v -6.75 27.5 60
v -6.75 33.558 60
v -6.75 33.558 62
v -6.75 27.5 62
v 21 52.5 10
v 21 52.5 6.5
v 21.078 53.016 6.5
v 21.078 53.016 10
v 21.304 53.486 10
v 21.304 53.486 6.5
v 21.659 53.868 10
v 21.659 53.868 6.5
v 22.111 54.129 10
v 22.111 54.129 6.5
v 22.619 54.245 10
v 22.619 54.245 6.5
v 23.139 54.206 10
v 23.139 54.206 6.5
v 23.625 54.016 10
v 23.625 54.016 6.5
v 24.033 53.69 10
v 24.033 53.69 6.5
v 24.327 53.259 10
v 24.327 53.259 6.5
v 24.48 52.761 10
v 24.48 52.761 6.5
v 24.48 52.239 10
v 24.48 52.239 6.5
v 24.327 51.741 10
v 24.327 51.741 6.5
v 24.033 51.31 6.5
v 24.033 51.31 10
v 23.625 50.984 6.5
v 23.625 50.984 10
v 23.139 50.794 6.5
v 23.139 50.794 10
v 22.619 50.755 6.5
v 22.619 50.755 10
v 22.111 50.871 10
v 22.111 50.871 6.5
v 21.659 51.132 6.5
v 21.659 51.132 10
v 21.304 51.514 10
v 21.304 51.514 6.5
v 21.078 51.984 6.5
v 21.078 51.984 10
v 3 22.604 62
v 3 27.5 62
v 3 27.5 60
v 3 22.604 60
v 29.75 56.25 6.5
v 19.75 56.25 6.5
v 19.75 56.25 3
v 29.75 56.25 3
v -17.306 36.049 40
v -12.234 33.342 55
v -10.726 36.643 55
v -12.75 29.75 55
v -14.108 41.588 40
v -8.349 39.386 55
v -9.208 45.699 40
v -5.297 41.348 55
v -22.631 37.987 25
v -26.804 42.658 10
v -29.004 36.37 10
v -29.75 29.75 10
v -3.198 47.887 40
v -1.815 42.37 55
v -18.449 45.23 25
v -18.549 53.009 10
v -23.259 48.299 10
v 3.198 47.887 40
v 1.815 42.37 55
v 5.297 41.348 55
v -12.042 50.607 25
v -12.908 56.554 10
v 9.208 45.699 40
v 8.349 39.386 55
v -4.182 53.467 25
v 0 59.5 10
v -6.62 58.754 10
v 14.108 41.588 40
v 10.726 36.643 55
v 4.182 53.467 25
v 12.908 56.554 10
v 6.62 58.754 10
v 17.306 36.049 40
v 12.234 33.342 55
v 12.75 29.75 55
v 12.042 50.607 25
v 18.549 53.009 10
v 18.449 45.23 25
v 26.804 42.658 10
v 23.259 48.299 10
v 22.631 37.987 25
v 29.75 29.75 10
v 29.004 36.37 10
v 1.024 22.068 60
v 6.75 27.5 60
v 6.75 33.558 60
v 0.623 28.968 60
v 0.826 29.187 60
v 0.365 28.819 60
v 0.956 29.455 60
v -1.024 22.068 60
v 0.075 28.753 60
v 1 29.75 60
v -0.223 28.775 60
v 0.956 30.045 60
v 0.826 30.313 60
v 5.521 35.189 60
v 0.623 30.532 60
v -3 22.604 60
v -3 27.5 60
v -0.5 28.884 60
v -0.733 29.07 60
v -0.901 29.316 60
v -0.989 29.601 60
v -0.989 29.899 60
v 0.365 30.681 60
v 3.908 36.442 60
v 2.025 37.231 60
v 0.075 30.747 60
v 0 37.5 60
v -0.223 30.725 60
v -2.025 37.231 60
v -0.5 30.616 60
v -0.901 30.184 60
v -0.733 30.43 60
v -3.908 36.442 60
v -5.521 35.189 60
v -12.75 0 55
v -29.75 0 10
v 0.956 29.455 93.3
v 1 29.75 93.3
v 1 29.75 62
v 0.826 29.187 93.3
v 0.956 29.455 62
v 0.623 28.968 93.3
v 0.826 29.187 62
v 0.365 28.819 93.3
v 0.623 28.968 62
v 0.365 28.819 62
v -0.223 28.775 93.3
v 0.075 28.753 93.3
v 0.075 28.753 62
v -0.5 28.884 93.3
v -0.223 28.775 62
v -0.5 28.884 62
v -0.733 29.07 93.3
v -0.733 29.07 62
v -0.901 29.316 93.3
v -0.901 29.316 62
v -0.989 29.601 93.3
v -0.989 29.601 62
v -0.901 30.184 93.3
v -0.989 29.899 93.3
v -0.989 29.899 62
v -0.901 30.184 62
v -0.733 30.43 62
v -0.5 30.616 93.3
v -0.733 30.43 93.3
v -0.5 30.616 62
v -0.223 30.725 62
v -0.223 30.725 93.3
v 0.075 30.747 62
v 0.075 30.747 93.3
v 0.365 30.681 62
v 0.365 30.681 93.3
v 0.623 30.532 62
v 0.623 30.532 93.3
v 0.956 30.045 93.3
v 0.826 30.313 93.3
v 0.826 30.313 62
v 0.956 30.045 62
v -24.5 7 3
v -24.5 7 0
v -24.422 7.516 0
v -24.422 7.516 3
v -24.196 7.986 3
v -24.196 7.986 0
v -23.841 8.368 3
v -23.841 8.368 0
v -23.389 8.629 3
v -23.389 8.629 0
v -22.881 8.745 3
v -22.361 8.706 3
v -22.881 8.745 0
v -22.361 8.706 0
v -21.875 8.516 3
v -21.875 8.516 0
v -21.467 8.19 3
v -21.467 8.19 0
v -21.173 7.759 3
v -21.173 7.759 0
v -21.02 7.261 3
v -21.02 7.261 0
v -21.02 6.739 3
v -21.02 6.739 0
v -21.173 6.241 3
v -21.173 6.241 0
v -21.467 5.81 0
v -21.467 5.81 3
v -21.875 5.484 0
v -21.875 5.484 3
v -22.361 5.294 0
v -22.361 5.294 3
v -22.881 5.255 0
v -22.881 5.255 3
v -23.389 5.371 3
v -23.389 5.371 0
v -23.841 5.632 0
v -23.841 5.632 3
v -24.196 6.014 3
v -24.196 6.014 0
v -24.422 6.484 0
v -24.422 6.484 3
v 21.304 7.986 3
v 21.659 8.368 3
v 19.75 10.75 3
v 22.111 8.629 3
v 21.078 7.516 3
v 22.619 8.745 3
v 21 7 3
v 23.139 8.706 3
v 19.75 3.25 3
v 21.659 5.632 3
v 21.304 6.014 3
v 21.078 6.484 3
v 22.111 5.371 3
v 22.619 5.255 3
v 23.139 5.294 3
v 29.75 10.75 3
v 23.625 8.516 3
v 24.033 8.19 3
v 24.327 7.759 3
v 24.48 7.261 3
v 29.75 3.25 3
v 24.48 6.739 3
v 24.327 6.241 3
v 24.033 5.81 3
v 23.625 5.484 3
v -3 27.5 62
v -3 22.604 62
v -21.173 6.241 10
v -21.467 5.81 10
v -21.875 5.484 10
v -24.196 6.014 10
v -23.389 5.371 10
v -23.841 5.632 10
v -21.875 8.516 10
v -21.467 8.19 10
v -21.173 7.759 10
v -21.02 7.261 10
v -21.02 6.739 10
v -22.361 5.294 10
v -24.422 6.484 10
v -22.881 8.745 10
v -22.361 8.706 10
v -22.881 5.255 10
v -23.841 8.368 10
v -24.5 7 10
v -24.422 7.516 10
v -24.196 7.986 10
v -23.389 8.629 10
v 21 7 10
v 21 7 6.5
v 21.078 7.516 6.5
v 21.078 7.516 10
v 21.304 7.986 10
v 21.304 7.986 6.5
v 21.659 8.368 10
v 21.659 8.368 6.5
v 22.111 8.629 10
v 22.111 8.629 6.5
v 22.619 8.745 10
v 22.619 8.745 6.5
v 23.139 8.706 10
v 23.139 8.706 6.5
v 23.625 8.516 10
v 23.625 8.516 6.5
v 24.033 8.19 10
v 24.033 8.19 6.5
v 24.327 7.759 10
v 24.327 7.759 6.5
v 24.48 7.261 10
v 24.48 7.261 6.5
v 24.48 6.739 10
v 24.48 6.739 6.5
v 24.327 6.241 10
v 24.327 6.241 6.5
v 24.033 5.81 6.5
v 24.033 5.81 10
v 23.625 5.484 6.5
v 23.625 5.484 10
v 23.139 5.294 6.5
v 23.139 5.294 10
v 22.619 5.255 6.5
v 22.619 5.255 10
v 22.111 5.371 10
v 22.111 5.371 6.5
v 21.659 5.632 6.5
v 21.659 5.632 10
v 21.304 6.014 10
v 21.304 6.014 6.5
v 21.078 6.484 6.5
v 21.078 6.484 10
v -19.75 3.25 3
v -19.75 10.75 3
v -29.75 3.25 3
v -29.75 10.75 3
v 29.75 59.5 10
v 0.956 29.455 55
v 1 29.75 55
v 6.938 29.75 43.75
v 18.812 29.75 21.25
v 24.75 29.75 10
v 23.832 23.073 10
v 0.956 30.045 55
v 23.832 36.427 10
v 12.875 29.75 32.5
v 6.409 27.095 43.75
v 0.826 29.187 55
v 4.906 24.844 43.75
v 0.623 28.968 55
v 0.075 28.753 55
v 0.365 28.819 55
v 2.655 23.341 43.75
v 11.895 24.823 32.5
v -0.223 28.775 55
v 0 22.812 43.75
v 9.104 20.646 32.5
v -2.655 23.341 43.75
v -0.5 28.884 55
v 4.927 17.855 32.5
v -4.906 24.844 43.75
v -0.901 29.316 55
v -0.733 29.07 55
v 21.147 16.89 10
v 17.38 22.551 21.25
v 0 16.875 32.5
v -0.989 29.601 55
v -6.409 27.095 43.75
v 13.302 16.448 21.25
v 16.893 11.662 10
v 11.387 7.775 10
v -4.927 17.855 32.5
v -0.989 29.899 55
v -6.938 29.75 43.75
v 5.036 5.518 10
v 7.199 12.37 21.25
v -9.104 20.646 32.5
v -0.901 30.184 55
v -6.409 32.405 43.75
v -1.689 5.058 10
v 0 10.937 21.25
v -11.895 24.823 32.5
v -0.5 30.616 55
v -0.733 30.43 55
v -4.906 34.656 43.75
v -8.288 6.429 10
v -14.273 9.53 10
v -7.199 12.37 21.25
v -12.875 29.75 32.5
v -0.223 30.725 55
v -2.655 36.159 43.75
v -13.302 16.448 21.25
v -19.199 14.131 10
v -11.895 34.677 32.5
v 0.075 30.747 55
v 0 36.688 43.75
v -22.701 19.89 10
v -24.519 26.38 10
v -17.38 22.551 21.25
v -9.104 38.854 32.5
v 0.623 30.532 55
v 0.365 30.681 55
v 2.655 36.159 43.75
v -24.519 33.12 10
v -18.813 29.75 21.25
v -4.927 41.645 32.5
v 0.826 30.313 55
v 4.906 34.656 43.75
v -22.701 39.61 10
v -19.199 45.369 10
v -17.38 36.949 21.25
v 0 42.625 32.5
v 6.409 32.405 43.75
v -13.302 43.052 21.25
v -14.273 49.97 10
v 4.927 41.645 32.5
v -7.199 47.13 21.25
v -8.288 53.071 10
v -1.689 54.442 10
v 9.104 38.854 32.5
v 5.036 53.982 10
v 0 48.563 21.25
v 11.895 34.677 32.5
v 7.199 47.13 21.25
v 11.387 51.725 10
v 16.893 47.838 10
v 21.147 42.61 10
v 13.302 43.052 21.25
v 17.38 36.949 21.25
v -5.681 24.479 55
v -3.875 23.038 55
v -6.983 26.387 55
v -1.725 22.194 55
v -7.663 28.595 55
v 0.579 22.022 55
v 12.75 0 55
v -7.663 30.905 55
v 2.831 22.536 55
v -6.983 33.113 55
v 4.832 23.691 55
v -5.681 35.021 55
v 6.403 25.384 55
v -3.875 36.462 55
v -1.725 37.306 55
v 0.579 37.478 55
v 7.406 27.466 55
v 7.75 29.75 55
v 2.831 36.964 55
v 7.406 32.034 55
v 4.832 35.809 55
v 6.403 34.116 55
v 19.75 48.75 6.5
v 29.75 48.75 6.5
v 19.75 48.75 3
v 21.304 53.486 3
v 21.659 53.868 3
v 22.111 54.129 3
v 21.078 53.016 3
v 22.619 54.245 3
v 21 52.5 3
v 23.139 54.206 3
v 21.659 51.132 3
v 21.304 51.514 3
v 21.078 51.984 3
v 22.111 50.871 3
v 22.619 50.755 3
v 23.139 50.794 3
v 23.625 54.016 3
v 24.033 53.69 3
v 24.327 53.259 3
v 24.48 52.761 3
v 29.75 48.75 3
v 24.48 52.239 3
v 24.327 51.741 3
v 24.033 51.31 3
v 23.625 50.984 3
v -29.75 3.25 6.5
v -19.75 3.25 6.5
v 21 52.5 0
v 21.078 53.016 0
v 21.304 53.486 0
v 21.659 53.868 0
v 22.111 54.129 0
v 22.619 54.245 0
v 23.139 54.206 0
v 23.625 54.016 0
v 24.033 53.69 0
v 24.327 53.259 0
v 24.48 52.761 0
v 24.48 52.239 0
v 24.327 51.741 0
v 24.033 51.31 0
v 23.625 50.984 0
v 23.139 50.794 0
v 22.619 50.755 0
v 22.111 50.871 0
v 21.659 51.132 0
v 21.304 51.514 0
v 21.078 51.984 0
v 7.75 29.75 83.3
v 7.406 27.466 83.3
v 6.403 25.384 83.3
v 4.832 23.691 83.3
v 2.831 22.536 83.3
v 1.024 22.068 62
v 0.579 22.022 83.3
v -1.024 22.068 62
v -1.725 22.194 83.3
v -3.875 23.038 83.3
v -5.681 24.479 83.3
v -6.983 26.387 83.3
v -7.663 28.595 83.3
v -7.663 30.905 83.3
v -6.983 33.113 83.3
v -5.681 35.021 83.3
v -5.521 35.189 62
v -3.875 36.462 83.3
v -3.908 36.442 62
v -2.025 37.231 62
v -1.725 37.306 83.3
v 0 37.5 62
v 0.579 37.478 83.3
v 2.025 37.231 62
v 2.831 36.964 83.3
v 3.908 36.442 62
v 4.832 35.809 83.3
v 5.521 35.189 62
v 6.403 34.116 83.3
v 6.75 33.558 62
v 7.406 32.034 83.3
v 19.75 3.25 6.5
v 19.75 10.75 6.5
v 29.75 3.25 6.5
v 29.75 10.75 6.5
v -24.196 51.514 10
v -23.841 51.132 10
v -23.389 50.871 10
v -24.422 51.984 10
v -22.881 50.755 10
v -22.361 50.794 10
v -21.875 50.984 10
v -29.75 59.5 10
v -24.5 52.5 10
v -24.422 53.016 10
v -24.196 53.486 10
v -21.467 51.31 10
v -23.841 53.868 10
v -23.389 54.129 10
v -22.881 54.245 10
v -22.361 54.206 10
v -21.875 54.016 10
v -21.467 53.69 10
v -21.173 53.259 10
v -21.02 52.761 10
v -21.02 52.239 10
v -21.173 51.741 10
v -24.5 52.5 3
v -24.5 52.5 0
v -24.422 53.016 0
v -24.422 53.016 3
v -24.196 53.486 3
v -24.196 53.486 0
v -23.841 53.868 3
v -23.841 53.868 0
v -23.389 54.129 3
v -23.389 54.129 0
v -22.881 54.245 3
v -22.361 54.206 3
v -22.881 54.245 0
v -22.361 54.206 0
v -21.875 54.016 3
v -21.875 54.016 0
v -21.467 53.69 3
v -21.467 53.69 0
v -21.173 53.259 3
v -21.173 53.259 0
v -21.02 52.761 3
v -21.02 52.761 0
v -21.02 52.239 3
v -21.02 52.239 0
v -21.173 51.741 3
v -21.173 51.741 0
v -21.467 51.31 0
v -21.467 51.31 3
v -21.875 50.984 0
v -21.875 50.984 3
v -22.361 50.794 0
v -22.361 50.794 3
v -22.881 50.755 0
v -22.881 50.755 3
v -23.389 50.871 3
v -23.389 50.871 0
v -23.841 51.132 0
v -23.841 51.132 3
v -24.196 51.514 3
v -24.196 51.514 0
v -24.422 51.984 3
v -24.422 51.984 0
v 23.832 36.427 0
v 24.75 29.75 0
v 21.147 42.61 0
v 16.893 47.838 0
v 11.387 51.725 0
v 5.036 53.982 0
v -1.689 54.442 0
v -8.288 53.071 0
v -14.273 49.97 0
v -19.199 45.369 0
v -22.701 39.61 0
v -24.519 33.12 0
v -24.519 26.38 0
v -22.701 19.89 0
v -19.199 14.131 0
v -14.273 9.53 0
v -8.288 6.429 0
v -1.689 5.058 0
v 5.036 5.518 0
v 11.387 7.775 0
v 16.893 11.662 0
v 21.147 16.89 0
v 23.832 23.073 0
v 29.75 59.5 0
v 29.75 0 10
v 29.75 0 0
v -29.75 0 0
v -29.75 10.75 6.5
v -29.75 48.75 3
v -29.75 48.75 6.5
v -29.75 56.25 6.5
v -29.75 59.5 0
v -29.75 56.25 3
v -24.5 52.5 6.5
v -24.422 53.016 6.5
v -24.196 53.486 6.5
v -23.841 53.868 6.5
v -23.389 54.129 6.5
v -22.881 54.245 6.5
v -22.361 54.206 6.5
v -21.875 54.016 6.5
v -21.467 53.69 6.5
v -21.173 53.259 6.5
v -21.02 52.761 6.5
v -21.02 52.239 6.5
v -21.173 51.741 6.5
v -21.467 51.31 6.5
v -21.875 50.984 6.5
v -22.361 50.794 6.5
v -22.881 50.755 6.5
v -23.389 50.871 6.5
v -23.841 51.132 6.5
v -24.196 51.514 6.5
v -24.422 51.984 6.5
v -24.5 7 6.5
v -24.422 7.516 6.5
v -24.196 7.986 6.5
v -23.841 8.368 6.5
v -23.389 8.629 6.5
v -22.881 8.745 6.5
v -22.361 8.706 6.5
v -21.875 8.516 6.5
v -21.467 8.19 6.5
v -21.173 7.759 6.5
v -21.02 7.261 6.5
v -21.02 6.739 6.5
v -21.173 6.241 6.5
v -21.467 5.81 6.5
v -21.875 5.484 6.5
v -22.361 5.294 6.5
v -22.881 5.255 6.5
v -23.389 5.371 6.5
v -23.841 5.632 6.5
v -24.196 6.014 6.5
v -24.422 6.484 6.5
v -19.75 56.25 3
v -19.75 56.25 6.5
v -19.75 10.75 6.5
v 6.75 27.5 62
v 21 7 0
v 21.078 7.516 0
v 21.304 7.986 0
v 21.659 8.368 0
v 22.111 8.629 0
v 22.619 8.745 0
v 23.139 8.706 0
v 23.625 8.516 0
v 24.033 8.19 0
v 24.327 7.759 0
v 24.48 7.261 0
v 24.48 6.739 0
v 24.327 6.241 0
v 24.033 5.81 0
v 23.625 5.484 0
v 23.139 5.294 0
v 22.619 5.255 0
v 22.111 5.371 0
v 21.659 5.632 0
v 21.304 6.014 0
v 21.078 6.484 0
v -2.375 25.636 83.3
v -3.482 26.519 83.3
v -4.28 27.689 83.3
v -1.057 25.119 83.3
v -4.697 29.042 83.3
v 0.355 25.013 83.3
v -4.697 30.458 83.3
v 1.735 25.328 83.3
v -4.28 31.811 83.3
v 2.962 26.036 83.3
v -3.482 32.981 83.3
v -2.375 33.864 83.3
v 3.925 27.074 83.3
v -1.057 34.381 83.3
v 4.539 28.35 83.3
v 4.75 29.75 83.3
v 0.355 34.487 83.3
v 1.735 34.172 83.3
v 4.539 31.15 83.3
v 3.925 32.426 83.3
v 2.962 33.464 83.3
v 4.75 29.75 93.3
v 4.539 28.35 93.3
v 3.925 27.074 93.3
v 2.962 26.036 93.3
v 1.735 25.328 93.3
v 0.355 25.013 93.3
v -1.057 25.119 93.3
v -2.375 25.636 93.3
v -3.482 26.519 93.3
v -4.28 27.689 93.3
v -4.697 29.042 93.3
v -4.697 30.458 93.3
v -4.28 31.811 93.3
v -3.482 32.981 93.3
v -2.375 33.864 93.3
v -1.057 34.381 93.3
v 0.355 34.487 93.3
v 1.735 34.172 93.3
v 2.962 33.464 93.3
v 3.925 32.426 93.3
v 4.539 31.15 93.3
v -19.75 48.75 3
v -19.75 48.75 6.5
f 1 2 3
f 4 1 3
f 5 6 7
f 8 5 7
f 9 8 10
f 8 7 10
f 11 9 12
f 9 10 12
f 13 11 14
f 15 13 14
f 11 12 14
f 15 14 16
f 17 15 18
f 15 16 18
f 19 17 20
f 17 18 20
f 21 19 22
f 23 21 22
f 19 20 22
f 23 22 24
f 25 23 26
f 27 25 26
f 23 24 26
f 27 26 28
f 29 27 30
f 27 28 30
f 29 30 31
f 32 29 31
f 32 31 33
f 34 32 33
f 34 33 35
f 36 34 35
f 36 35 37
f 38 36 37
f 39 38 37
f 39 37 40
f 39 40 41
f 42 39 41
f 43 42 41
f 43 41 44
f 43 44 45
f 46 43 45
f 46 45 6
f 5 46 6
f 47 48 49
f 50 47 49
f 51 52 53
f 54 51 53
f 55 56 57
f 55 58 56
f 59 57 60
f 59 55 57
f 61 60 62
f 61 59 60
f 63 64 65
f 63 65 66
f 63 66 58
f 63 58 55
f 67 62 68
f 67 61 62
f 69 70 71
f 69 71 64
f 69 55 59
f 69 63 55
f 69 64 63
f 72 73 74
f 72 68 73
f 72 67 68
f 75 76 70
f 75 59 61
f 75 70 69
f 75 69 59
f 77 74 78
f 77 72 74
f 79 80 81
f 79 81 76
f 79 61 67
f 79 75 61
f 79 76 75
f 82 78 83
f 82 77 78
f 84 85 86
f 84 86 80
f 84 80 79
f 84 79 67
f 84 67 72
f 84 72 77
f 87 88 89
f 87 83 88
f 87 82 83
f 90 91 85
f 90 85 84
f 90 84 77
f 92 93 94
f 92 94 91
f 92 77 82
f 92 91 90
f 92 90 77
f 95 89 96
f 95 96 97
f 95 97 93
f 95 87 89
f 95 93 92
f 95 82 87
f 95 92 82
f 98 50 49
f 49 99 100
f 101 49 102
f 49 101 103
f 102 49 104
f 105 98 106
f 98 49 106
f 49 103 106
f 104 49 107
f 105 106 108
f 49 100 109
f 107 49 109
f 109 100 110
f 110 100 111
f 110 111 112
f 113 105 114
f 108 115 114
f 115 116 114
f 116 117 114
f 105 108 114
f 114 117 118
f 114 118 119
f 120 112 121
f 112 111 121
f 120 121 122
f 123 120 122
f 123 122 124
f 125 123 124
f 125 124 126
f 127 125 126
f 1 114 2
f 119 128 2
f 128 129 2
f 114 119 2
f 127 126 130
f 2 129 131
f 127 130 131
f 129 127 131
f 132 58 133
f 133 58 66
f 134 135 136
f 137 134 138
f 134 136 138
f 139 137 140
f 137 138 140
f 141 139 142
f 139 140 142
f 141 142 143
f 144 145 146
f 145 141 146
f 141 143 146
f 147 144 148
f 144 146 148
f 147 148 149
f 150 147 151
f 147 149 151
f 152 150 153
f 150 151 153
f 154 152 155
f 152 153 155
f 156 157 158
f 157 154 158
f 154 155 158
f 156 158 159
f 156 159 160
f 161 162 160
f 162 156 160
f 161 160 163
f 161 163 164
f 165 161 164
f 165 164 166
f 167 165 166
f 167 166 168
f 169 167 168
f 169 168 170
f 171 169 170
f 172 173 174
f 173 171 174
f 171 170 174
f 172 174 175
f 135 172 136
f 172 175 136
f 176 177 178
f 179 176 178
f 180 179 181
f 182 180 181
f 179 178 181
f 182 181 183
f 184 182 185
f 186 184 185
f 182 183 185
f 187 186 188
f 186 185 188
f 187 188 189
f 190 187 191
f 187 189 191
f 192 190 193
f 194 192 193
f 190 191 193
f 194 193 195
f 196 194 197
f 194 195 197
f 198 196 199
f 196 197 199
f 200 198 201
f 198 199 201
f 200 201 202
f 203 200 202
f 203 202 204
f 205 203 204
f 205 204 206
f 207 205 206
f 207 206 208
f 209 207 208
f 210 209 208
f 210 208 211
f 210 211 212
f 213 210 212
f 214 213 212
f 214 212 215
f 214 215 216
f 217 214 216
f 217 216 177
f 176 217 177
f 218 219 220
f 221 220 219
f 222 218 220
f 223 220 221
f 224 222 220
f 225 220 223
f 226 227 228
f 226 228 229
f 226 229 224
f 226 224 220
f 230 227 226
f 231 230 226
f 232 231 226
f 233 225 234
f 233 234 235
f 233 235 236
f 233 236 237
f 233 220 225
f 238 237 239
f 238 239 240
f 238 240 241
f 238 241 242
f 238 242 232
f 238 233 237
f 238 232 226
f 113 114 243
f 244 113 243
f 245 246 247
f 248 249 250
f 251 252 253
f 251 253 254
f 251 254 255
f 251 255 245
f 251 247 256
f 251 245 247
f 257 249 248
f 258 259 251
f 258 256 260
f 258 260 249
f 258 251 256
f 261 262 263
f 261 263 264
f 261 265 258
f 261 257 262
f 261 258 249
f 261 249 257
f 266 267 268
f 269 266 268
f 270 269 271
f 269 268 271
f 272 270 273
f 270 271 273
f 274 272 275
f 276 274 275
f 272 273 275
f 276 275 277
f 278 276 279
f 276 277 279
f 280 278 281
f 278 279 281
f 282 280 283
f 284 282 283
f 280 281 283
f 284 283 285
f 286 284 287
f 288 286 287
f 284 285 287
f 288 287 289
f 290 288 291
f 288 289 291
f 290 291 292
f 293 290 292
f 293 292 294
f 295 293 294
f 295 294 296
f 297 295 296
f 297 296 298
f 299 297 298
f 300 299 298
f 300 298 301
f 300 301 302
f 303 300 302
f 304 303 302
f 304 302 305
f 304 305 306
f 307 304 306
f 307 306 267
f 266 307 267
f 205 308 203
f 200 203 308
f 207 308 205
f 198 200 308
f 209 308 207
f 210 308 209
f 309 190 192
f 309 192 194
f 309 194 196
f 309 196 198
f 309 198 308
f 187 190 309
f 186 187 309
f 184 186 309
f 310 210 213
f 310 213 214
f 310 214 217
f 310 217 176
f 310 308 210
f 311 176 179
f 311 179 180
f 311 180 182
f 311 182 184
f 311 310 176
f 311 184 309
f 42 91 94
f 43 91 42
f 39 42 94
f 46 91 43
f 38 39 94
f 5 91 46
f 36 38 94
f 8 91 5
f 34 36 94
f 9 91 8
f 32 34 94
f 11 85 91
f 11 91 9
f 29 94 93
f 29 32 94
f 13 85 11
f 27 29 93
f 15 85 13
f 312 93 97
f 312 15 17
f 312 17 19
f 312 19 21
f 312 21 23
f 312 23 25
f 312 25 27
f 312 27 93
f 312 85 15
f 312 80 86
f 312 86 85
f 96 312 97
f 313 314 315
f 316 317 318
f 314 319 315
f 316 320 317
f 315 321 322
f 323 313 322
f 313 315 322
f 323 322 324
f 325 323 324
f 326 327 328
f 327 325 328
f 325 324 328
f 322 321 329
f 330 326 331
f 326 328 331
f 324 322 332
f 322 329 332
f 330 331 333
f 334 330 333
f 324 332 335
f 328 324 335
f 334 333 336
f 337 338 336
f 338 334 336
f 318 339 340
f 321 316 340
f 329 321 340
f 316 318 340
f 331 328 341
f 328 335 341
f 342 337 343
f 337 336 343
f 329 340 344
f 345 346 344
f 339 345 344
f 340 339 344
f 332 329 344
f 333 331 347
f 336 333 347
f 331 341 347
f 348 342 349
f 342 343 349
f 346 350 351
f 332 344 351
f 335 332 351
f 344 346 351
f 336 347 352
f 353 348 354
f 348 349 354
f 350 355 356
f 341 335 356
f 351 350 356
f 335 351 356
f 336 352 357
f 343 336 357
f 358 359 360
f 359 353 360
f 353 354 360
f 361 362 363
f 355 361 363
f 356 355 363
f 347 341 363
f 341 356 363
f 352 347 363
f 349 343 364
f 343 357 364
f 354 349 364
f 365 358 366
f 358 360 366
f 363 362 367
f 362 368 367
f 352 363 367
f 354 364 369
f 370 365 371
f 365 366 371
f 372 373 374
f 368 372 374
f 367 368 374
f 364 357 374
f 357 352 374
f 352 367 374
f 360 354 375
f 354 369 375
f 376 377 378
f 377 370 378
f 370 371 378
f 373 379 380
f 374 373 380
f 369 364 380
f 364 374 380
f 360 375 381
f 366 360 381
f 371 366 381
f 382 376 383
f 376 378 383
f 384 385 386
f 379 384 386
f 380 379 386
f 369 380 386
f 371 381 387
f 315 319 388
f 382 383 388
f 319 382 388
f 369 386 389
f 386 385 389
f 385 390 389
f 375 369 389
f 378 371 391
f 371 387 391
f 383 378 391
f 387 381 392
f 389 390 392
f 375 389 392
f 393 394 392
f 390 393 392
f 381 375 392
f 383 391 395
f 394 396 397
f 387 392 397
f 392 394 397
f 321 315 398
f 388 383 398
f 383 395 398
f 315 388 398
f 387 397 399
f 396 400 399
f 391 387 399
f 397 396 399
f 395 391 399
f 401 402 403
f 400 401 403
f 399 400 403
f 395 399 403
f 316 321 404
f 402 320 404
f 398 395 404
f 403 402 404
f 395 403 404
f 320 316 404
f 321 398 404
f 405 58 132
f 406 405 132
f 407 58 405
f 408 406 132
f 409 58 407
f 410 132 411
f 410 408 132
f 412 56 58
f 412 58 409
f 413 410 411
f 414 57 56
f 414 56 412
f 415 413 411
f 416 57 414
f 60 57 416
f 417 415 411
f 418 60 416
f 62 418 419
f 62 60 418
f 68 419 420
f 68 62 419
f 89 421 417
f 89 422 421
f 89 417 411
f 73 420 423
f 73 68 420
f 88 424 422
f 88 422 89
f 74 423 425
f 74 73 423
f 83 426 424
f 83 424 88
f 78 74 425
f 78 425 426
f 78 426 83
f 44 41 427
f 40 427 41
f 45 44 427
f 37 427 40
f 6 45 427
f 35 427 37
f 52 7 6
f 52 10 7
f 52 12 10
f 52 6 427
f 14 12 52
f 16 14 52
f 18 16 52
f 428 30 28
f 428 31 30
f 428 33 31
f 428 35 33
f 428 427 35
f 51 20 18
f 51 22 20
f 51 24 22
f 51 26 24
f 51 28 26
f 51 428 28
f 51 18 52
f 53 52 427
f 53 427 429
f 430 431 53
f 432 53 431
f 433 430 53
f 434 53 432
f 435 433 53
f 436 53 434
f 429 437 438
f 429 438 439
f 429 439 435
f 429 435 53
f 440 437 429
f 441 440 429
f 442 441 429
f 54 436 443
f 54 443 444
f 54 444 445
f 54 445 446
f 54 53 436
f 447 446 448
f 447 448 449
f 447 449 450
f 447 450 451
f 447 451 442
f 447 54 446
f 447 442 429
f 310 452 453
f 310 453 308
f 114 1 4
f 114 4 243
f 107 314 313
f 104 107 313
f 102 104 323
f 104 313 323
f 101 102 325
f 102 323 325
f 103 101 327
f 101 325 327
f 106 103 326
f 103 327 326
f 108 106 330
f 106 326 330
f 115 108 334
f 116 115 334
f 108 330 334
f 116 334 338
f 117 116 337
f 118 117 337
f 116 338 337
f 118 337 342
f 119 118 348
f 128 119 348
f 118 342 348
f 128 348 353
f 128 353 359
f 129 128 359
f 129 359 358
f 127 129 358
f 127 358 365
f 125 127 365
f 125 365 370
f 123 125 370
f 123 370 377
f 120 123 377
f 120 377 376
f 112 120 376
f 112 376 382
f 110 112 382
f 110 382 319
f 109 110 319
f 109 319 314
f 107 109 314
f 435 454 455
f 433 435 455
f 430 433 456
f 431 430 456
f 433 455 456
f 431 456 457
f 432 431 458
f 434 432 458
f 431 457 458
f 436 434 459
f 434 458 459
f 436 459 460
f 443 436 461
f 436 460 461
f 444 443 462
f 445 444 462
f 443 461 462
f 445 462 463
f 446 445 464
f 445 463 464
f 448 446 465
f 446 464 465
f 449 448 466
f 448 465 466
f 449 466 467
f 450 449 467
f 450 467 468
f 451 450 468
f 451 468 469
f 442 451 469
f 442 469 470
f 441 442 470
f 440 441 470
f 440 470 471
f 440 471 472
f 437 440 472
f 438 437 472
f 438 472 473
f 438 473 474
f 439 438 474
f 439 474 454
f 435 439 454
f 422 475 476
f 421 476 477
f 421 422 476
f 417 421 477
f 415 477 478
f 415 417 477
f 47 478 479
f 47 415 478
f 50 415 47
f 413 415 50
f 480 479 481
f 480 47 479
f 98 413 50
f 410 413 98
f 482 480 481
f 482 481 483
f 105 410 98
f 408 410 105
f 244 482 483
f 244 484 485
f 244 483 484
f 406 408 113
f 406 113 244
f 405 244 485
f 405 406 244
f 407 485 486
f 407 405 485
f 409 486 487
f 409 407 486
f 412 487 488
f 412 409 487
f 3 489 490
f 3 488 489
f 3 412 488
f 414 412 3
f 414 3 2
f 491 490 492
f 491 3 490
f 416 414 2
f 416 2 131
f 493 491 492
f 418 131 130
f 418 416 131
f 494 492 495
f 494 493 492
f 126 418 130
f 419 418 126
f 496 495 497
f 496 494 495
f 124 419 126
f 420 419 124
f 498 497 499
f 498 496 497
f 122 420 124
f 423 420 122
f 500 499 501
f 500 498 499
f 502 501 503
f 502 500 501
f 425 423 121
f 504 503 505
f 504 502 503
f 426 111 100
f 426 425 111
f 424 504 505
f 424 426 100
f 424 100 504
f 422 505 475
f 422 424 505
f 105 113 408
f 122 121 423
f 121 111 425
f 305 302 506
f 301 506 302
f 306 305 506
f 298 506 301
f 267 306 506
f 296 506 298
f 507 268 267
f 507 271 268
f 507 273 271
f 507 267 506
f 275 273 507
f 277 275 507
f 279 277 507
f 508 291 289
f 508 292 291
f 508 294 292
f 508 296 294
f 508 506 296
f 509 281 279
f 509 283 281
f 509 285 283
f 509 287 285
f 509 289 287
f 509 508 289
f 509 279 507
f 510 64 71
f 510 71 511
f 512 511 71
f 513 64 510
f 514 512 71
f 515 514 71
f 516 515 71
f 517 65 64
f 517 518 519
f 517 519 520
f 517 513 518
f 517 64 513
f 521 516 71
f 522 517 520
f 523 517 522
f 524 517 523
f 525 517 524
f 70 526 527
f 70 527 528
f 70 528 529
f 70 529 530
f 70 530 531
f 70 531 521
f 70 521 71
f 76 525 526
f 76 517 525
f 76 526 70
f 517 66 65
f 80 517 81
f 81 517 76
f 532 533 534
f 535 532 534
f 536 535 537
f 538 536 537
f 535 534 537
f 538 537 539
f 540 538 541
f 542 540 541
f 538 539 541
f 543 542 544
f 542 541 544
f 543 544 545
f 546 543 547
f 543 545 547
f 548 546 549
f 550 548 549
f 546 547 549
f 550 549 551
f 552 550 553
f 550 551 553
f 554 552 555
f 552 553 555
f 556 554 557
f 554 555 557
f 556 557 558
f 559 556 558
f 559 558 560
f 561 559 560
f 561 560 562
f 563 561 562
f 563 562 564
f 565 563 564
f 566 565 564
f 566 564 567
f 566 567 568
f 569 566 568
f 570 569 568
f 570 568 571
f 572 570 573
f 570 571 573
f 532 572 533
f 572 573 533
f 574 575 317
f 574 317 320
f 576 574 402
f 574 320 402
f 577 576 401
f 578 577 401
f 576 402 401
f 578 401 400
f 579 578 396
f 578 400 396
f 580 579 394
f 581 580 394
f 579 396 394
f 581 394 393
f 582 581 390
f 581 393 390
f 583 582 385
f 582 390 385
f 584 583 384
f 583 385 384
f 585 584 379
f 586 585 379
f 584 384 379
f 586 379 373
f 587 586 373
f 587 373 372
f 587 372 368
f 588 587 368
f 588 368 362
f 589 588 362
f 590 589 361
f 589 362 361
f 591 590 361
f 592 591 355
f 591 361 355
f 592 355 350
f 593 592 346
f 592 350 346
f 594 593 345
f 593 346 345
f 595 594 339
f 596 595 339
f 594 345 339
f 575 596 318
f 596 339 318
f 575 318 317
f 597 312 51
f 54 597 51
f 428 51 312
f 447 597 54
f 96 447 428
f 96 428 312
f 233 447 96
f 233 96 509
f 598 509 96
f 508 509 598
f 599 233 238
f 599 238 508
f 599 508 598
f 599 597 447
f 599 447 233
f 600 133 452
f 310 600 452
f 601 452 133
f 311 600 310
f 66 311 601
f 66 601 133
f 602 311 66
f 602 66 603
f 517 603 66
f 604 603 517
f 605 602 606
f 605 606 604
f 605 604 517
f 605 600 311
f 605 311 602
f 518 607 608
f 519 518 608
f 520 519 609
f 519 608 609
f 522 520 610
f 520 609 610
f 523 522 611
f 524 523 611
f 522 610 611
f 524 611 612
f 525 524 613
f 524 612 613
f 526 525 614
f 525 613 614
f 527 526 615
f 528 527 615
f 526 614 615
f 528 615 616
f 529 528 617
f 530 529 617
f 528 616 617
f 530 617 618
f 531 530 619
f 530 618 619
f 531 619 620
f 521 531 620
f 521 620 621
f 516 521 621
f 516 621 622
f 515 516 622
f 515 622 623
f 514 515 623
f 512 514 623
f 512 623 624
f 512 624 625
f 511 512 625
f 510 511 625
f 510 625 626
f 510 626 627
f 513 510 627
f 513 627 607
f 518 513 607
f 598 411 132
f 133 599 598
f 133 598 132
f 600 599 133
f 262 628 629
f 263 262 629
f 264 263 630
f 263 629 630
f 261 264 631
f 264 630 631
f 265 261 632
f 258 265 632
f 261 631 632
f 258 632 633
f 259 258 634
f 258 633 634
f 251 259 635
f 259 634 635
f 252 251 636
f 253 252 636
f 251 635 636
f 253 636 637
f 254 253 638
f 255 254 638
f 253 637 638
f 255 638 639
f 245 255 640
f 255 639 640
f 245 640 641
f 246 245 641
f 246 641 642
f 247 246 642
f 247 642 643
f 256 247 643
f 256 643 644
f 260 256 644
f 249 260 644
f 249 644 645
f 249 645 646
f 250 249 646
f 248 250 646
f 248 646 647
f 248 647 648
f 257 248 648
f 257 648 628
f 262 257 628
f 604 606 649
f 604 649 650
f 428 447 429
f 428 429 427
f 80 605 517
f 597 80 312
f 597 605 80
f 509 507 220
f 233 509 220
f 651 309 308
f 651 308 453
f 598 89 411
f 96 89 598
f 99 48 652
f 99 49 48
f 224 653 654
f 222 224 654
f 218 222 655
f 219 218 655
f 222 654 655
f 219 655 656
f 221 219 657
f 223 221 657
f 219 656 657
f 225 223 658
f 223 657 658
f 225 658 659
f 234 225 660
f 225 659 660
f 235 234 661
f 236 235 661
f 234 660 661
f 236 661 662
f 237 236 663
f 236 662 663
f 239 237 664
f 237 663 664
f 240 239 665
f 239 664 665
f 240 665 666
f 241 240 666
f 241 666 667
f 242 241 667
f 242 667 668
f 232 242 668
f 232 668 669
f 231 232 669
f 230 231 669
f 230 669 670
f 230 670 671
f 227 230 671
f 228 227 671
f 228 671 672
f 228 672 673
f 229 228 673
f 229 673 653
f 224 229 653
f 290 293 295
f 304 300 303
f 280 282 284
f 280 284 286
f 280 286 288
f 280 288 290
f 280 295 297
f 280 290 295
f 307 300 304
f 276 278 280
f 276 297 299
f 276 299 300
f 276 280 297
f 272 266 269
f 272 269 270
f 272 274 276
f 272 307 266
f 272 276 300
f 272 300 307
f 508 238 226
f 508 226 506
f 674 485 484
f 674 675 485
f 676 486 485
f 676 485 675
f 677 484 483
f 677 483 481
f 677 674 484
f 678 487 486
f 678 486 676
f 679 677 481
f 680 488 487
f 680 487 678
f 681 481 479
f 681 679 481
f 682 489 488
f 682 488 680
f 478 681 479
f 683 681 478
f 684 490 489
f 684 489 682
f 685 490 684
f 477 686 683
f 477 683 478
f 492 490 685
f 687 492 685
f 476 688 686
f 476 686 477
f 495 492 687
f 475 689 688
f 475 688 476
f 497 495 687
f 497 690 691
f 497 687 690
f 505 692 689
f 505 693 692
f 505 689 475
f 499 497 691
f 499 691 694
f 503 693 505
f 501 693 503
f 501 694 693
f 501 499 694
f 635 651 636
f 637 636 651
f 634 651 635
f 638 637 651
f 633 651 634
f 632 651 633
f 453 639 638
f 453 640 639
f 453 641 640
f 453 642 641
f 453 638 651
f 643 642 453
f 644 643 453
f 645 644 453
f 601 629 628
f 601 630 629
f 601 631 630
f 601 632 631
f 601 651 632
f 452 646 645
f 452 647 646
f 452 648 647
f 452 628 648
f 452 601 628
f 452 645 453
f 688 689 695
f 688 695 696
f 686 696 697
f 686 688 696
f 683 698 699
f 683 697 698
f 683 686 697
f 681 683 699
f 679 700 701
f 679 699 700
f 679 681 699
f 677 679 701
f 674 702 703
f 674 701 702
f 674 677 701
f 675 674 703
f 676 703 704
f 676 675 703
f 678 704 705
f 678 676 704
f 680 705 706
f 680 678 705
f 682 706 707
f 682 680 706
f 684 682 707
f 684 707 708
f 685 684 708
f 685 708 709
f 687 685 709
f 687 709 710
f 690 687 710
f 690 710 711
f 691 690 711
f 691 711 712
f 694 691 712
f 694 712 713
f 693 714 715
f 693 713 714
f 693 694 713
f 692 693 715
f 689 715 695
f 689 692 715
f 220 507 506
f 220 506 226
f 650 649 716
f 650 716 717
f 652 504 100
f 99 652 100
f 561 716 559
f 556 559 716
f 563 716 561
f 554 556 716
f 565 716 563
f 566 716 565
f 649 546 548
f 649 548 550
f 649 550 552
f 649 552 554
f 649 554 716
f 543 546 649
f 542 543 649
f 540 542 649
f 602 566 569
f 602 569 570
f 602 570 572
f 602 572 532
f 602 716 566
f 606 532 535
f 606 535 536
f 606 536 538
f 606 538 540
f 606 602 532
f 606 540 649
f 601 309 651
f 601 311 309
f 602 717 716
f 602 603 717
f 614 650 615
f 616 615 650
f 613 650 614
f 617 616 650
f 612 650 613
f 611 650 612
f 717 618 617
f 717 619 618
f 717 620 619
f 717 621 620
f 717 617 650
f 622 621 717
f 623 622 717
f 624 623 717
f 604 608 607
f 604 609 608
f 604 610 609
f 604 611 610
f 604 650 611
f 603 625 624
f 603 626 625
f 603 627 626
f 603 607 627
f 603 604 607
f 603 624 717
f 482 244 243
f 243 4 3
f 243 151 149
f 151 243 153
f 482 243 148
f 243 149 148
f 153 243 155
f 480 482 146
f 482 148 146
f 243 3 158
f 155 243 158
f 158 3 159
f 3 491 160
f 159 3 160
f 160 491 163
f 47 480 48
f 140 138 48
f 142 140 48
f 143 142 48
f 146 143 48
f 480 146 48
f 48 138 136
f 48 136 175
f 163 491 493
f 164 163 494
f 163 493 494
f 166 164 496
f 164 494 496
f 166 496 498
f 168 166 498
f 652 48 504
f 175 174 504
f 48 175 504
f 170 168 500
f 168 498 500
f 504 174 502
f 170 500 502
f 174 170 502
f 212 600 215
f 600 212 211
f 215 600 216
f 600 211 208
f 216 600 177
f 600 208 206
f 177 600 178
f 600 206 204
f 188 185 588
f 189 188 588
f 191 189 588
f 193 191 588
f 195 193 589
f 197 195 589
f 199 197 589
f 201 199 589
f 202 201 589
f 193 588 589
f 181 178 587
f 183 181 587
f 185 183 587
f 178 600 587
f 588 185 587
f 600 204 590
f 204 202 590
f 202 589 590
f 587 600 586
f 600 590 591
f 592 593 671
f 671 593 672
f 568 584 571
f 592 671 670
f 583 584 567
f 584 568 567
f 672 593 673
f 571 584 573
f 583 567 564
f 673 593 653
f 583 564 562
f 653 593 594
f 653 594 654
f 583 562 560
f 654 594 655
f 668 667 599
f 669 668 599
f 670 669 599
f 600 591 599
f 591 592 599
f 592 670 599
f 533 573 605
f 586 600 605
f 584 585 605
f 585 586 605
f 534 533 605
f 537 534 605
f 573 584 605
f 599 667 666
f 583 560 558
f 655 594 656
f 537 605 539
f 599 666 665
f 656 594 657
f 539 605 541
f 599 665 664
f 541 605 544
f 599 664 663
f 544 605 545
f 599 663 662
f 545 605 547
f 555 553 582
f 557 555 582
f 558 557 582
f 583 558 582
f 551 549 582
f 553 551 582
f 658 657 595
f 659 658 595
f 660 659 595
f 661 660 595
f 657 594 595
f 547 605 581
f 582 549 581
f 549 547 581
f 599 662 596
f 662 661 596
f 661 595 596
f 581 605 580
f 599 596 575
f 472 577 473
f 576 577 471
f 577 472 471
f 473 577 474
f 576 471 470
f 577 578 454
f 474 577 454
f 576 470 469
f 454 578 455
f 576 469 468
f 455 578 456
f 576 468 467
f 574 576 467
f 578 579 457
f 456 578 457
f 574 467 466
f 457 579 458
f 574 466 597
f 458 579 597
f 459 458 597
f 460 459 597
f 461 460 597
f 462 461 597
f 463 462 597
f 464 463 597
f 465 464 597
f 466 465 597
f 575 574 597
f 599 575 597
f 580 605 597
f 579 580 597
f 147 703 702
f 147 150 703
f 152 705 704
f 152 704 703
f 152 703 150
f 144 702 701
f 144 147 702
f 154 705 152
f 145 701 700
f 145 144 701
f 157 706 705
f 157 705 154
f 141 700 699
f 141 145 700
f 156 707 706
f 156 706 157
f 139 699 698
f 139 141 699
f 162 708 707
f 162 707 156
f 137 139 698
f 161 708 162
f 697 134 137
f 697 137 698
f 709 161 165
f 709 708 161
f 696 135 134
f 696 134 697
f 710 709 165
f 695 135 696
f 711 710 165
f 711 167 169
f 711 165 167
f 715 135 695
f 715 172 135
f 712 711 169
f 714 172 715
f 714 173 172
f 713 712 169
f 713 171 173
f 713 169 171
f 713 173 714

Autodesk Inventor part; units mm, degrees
ref_plane "YZ Plane" through (0, 0, 0) normal (1, 0, 0) x (0, 1, 0)
ref_plane "XZ Plane" through (0, 0, 0) normal (0, 1, 0) x (-1, 0, 0)
sketch "Sketch2" plane through (0, 0, 0) normal (0, 0, 1) x (1, 0, 0)
  line L0 (-29.75, 59.5) -> (29.75, 59.5)
  line L1 (29.75, 59.5) -> (29.75, 0)
  line L2 (29.75, 0) -> (-29.75, 0)
  line L3 (-29.75, 0) -> (-29.75, 59.5)
  point P0 (0, 0)
  point P1 (0, 0)
  dimension "d0" = 59.5
extrude "Extrusion1" add sketch "Sketch2" along normal blind 55
sketch "Sketch3" plane through (0, 0, 55) normal (0, 0, 1) x (1, 0, 0)
  circle A0 centre (0, 29.75) radius 1
  circle A1 centre (0, 29.75) radius 7.75
  line L0 (0, 0) -> (0, 59.5) construction
  line L1 (29.75, 59.5) -> (-29.75, 59.5) construction
  line L2 (29.75, 0) -> (29.75, 59.5) construction
  line L3 (29.75, 29.75) -> (-29.75, 29.75) construction
  line L4 (-29.75, 59.5) -> (-29.75, 0) construction
  line L5 (-29.75, 0) -> (29.75, 0) projected
  dimension "d3" = 15.5
  dimension "d5" = 2
  dimension "d47" = 22
extrude "Extrusion2" add sketch "Sketch3" along normal blind 28.3
sketch "Sketch4" plane through (0, 29.75, 83.3) normal (0, 0, 1) x (1, 0, 0)
  circle A0 centre (0, 0) radius 1
  circle A1 centre (0, 0) radius 4.75
  circle A2 centre (0, 0) radius 1 projected
  point P0 (0, -29.75)
  dimension "d8" = 9.5
extrude "Extrusion3" add sketch "Sketch4" along normal blind 10
sketch "Sketch10" plane through (0, 0, 0) normal (0, 0, -1) x (-1, 0, 0)
  circle A0 centre (-22.75, 52.5) radius 1.75
  circle A1 centre (-22.75, 7) radius 1.75
  circle A2 centre (22.75, 52.5) radius 1.75
  circle A3 centre (22.75, 7) radius 1.75
  line L0 (-29.75, 59.5) -> (-29.75, 0) projected
  line L1 (29.75, 59.5) -> (-29.75, 59.5) projected
  line L2 (-29.75, 29.75) -> (29.75, 29.75) construction
  line L3 (29.75, 0) -> (29.75, 59.5) construction
  line L4 (0, 59.5) -> (0, 0) construction
  dimension "d29" = 7
  dimension "d30" = 7
  dimension "d33" = 3.5
extrude "Extrusion5" cut sketch "Sketch10" against normal blind 10
sketch "Sketch9" plane through (29.75, 0, 0) normal (1, 0, 0) x (0, 0, -1)
  line L0 (-6.5, 56.25) -> (-3, 56.25)
  line L1 (-3, 56.25) -> (-3, 48.75)
  line L2 (-3, 48.75) -> (-6.5, 48.75)
  line L3 (-6.5, 48.75) -> (-6.5, 56.25)
  line L4 (-6.5, 10.75) -> (-3, 10.75)
  line L5 (-3, 10.75) -> (-3, 3.25)
  line L6 (-3, 3.25) -> (-6.5, 3.25)
  line L7 (-6.5, 3.25) -> (-6.5, 10.75)
  line L8 (0, 59.5) -> (-55, 59.5) projected
  line L9 (-55, 0) -> (-55, 59.5) construction
  line L10 (-55, 29.75) -> (0, 29.75) construction
  line L11 (0, 0) -> (0, 59.5) construction
  line L12 (0, 54.25) -> (0, 50.75) projected
  line L13 (0, 52.5) -> (-10, 52.5) construction
  line L14 (-10, 54.25) -> (-10, 50.75) projected
  dimension "d24" = 7.5
  dimension "d25" = 3.5
  dimension "d26" = 3
extrude "Extrusion4" cut sketch "Sketch9" against normal blind 10
mirror "Mirror1" about plane through (0, 0, 0) normal (1, 0, 0) of "Extrusion4"
ref_plane "Work Plane1" through (0, 0, 10) normal (0, 0, 1) x (1, 0, 0)
sketch "Sketch11" plane through (0, 0, 10) normal (0, 0, 1) x (1, 0, 0)
  circle A0 centre (0, 29.75) radius 24.75
  circle A1 centre (0, 29.75) radius 1 projected
  line L0 (-29.75, 59.5) -> (29.75, 59.5) projected
  point P0 (0, 0)
  dimension "d49" = 5
extrude "Extrusion6" cut sketch "Sketch11" against normal through all contours A0 | A1
loft "Loft2" cut section 1 edges at (-24.75, 29.75, 10) section 2 edges at (-1, 29.75, 55)
sketch "Sketch7" plane through (-29.75, 59.5, 0) normal (0, 1, 0) x (1, 0, 0)
  line L0 (36.5, -60) -> (23, -60)
  line L1 (23, -60) -> (23, -62)
  line L2 (23, -62) -> (36.5, -62)
  line L3 (36.5, -62) -> (36.5, -60)
  line L4 (29.75, -60) -> (29.75, -62) construction
  line L5 (26.5, -55) -> (28.5, -55) construction
  line L6 (29.75, -55) -> (29.75, -83.3) construction
  line L7 (59.5, -55) -> (0, -55) construction
  line L8 (22, -83.3) -> (37.5, -83.3) projected
  point P0 (29.75, 0)
  dimension "d16" = 2
  dimension "d17" = 13.5
  dimension "d18" = 5
extrude "Extrusion7" cut sketch "Sketch7" against normal blind 32
sketch "Sketch12" plane through (-29.75, 27.5, 0) normal (0, 1, 0) x (1, 0, 0)
  line L0 (32.75, -60) -> (26.75, -60)
  line L1 (26.75, -60) -> (26.75, -62)
  line L2 (26.75, -62) -> (32.75, -62)
  line L3 (32.75, -62) -> (32.75, -60)
  line L4 (36.5, -60) -> (36.5, -62) projected
  line L5 (36.5, -62) -> (23, -62) projected
  line L6 (28.75, -60) -> (30.75, -60) construction
  line L7 (29.75, -60) -> (29.75, -62) construction
  line L8 (30.75, -62) -> (28.75, -62) construction
  point P0 (29.75, 0)
  point P1 (22.3338, -63)
  dimension "d44" = 6
extrude "Extrusion8" cut sketch "Sketch12" against normal through all
sketch "Sketch14" plane through (0, 0, 0) normal (1, 0, 0) x (0, 1, 0)
  line L0 (59.5, 10) -> (42.5, 55)
  line L1 (42.5, 55) -> (79.5, 55)
  line L2 (79.5, 10) -> (79.5, 55)
  line L3 (59.5, 55) -> (0, 55) projected
  line L4 (37.5, 55) -> (37.5, 83.3) projected
  line L5 (59.5, 0) -> (59.5, 55) projected
  line L6 (5, 10) -> (54.5, 10) projected
  line L7 (79.5, 10) -> (59.5, 10)
  line L8 (59.5, 0) -> (59.5, 55) projected
  line L9 (54.25, 10) -> (50.75, 10) projected
  line L10 (29.75, -18.66) -> (29.75, 111.96) projected
  point P0 (0, 0)
  point P1 (55, 37.5)
  point P2 (55, 37.5)
  dimension "d54" = 5
  dimension "d55" = 20
revolve "Revolution1" cut sketch "Sketch14" angle 180 mid plane about axis through (0, 29.75, 55) along (0, 0, 1)
sketch "Sketch15" plane through (12.75, 29.75, 55) normal (0, 1, 0) x (1, 0, 0)
  line L0 (-42.5, 0) -> (-25.5, 0)
  line L1 (-25.5, 0) -> (0, 0)
  line L2 (-42.5, 0) -> (17, 0) projected
  line L3 (0, 0) -> (17, 0)
  line L4 (17, 0) -> (17, 45)
  line L5 (17, 55) -> (17, 0) projected
  line L6 (0, 0) -> (17, 45)
  line L7 (0, 0) -> (17, 45) projected
  line L8 (17, 45) -> (-25.5, 0)
  line L9 (-25.5, 0) -> (-42.5, 45)
  line L10 (-42.5, 45) -> (-25.5, 0) projected
  line L11 (-42.5, 0) -> (-42.5, 45)
  line L12 (-42.5, 55) -> (-42.5, 0) projected
  point P0 (-12.75, 55)
extrude "Extrusion10" cut sketch "Sketch15" against normal through all contours L11 L9 L0 | L6 L4 L2
properties part number "Power_Meter_Adapter_Part1"
